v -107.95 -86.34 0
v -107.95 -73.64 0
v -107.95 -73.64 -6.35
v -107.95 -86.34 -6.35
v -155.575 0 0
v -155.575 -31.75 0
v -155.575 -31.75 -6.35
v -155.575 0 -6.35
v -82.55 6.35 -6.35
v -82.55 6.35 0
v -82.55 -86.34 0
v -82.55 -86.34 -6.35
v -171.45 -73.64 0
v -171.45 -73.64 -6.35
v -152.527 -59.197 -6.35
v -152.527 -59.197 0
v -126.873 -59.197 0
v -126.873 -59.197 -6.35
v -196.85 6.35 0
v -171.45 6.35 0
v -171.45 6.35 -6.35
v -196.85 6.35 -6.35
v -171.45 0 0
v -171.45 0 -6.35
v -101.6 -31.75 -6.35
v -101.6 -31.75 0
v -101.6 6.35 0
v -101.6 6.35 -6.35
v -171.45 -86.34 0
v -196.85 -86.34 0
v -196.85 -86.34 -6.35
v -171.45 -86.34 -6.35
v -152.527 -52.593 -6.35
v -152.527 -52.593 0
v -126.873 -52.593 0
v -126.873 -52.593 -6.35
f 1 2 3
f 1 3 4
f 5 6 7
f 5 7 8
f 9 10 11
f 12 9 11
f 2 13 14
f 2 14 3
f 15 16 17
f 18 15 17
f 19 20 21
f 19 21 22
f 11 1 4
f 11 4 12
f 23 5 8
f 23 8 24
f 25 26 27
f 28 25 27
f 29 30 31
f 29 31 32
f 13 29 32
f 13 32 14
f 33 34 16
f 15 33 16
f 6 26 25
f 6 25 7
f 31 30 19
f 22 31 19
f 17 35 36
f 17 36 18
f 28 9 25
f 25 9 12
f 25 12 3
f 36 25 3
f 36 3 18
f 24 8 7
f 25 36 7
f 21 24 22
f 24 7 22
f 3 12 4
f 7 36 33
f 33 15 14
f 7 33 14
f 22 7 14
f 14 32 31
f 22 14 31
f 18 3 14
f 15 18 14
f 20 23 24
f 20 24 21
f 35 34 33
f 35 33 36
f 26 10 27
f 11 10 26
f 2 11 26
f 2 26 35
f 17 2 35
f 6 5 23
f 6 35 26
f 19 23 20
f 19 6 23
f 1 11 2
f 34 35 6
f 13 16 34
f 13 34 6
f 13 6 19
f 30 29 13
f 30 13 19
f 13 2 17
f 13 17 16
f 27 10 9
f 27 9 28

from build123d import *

# Parameters (mm, degrees)
SKETCH2_W           = 25.654
SKETCH2_H           = 6.604
BOSS_EXTRUDE1_DEPTH = 6.35


with BuildPart() as part:
    # Sketch2 → Boss-Extrude1 (new body)
    with BuildSketch(Plane(origin=(0, 0, 0), x_dir=(1, 0, 0), z_dir=(0, 0, -1))):
        Polygon((-82.55, 73.64), (-82.55, 0), (-82.55, -6.35), (-101.6, -6.35), (-101.6, 0), (-101.6, 31.75), (-155.575, 31.75), (-155.575, 0), (-171.45, 0), (-171.45, -6.35), (-196.85, -6.35), (-196.85, 0), (-196.85, 73.64), (-196.85, 86.34), (-171.45, 86.34), (-171.45, 73.64), (-107.95, 73.64), (-107.95, 86.34), (-82.55, 86.34), align=None)
        with Locations((-139.7, 55.895)):
            Rectangle(SKETCH2_W, SKETCH2_H, mode=Mode.SUBTRACT)
    extrude(amount=BOSS_EXTRUDE1_DEPTH)


solid = part.part
